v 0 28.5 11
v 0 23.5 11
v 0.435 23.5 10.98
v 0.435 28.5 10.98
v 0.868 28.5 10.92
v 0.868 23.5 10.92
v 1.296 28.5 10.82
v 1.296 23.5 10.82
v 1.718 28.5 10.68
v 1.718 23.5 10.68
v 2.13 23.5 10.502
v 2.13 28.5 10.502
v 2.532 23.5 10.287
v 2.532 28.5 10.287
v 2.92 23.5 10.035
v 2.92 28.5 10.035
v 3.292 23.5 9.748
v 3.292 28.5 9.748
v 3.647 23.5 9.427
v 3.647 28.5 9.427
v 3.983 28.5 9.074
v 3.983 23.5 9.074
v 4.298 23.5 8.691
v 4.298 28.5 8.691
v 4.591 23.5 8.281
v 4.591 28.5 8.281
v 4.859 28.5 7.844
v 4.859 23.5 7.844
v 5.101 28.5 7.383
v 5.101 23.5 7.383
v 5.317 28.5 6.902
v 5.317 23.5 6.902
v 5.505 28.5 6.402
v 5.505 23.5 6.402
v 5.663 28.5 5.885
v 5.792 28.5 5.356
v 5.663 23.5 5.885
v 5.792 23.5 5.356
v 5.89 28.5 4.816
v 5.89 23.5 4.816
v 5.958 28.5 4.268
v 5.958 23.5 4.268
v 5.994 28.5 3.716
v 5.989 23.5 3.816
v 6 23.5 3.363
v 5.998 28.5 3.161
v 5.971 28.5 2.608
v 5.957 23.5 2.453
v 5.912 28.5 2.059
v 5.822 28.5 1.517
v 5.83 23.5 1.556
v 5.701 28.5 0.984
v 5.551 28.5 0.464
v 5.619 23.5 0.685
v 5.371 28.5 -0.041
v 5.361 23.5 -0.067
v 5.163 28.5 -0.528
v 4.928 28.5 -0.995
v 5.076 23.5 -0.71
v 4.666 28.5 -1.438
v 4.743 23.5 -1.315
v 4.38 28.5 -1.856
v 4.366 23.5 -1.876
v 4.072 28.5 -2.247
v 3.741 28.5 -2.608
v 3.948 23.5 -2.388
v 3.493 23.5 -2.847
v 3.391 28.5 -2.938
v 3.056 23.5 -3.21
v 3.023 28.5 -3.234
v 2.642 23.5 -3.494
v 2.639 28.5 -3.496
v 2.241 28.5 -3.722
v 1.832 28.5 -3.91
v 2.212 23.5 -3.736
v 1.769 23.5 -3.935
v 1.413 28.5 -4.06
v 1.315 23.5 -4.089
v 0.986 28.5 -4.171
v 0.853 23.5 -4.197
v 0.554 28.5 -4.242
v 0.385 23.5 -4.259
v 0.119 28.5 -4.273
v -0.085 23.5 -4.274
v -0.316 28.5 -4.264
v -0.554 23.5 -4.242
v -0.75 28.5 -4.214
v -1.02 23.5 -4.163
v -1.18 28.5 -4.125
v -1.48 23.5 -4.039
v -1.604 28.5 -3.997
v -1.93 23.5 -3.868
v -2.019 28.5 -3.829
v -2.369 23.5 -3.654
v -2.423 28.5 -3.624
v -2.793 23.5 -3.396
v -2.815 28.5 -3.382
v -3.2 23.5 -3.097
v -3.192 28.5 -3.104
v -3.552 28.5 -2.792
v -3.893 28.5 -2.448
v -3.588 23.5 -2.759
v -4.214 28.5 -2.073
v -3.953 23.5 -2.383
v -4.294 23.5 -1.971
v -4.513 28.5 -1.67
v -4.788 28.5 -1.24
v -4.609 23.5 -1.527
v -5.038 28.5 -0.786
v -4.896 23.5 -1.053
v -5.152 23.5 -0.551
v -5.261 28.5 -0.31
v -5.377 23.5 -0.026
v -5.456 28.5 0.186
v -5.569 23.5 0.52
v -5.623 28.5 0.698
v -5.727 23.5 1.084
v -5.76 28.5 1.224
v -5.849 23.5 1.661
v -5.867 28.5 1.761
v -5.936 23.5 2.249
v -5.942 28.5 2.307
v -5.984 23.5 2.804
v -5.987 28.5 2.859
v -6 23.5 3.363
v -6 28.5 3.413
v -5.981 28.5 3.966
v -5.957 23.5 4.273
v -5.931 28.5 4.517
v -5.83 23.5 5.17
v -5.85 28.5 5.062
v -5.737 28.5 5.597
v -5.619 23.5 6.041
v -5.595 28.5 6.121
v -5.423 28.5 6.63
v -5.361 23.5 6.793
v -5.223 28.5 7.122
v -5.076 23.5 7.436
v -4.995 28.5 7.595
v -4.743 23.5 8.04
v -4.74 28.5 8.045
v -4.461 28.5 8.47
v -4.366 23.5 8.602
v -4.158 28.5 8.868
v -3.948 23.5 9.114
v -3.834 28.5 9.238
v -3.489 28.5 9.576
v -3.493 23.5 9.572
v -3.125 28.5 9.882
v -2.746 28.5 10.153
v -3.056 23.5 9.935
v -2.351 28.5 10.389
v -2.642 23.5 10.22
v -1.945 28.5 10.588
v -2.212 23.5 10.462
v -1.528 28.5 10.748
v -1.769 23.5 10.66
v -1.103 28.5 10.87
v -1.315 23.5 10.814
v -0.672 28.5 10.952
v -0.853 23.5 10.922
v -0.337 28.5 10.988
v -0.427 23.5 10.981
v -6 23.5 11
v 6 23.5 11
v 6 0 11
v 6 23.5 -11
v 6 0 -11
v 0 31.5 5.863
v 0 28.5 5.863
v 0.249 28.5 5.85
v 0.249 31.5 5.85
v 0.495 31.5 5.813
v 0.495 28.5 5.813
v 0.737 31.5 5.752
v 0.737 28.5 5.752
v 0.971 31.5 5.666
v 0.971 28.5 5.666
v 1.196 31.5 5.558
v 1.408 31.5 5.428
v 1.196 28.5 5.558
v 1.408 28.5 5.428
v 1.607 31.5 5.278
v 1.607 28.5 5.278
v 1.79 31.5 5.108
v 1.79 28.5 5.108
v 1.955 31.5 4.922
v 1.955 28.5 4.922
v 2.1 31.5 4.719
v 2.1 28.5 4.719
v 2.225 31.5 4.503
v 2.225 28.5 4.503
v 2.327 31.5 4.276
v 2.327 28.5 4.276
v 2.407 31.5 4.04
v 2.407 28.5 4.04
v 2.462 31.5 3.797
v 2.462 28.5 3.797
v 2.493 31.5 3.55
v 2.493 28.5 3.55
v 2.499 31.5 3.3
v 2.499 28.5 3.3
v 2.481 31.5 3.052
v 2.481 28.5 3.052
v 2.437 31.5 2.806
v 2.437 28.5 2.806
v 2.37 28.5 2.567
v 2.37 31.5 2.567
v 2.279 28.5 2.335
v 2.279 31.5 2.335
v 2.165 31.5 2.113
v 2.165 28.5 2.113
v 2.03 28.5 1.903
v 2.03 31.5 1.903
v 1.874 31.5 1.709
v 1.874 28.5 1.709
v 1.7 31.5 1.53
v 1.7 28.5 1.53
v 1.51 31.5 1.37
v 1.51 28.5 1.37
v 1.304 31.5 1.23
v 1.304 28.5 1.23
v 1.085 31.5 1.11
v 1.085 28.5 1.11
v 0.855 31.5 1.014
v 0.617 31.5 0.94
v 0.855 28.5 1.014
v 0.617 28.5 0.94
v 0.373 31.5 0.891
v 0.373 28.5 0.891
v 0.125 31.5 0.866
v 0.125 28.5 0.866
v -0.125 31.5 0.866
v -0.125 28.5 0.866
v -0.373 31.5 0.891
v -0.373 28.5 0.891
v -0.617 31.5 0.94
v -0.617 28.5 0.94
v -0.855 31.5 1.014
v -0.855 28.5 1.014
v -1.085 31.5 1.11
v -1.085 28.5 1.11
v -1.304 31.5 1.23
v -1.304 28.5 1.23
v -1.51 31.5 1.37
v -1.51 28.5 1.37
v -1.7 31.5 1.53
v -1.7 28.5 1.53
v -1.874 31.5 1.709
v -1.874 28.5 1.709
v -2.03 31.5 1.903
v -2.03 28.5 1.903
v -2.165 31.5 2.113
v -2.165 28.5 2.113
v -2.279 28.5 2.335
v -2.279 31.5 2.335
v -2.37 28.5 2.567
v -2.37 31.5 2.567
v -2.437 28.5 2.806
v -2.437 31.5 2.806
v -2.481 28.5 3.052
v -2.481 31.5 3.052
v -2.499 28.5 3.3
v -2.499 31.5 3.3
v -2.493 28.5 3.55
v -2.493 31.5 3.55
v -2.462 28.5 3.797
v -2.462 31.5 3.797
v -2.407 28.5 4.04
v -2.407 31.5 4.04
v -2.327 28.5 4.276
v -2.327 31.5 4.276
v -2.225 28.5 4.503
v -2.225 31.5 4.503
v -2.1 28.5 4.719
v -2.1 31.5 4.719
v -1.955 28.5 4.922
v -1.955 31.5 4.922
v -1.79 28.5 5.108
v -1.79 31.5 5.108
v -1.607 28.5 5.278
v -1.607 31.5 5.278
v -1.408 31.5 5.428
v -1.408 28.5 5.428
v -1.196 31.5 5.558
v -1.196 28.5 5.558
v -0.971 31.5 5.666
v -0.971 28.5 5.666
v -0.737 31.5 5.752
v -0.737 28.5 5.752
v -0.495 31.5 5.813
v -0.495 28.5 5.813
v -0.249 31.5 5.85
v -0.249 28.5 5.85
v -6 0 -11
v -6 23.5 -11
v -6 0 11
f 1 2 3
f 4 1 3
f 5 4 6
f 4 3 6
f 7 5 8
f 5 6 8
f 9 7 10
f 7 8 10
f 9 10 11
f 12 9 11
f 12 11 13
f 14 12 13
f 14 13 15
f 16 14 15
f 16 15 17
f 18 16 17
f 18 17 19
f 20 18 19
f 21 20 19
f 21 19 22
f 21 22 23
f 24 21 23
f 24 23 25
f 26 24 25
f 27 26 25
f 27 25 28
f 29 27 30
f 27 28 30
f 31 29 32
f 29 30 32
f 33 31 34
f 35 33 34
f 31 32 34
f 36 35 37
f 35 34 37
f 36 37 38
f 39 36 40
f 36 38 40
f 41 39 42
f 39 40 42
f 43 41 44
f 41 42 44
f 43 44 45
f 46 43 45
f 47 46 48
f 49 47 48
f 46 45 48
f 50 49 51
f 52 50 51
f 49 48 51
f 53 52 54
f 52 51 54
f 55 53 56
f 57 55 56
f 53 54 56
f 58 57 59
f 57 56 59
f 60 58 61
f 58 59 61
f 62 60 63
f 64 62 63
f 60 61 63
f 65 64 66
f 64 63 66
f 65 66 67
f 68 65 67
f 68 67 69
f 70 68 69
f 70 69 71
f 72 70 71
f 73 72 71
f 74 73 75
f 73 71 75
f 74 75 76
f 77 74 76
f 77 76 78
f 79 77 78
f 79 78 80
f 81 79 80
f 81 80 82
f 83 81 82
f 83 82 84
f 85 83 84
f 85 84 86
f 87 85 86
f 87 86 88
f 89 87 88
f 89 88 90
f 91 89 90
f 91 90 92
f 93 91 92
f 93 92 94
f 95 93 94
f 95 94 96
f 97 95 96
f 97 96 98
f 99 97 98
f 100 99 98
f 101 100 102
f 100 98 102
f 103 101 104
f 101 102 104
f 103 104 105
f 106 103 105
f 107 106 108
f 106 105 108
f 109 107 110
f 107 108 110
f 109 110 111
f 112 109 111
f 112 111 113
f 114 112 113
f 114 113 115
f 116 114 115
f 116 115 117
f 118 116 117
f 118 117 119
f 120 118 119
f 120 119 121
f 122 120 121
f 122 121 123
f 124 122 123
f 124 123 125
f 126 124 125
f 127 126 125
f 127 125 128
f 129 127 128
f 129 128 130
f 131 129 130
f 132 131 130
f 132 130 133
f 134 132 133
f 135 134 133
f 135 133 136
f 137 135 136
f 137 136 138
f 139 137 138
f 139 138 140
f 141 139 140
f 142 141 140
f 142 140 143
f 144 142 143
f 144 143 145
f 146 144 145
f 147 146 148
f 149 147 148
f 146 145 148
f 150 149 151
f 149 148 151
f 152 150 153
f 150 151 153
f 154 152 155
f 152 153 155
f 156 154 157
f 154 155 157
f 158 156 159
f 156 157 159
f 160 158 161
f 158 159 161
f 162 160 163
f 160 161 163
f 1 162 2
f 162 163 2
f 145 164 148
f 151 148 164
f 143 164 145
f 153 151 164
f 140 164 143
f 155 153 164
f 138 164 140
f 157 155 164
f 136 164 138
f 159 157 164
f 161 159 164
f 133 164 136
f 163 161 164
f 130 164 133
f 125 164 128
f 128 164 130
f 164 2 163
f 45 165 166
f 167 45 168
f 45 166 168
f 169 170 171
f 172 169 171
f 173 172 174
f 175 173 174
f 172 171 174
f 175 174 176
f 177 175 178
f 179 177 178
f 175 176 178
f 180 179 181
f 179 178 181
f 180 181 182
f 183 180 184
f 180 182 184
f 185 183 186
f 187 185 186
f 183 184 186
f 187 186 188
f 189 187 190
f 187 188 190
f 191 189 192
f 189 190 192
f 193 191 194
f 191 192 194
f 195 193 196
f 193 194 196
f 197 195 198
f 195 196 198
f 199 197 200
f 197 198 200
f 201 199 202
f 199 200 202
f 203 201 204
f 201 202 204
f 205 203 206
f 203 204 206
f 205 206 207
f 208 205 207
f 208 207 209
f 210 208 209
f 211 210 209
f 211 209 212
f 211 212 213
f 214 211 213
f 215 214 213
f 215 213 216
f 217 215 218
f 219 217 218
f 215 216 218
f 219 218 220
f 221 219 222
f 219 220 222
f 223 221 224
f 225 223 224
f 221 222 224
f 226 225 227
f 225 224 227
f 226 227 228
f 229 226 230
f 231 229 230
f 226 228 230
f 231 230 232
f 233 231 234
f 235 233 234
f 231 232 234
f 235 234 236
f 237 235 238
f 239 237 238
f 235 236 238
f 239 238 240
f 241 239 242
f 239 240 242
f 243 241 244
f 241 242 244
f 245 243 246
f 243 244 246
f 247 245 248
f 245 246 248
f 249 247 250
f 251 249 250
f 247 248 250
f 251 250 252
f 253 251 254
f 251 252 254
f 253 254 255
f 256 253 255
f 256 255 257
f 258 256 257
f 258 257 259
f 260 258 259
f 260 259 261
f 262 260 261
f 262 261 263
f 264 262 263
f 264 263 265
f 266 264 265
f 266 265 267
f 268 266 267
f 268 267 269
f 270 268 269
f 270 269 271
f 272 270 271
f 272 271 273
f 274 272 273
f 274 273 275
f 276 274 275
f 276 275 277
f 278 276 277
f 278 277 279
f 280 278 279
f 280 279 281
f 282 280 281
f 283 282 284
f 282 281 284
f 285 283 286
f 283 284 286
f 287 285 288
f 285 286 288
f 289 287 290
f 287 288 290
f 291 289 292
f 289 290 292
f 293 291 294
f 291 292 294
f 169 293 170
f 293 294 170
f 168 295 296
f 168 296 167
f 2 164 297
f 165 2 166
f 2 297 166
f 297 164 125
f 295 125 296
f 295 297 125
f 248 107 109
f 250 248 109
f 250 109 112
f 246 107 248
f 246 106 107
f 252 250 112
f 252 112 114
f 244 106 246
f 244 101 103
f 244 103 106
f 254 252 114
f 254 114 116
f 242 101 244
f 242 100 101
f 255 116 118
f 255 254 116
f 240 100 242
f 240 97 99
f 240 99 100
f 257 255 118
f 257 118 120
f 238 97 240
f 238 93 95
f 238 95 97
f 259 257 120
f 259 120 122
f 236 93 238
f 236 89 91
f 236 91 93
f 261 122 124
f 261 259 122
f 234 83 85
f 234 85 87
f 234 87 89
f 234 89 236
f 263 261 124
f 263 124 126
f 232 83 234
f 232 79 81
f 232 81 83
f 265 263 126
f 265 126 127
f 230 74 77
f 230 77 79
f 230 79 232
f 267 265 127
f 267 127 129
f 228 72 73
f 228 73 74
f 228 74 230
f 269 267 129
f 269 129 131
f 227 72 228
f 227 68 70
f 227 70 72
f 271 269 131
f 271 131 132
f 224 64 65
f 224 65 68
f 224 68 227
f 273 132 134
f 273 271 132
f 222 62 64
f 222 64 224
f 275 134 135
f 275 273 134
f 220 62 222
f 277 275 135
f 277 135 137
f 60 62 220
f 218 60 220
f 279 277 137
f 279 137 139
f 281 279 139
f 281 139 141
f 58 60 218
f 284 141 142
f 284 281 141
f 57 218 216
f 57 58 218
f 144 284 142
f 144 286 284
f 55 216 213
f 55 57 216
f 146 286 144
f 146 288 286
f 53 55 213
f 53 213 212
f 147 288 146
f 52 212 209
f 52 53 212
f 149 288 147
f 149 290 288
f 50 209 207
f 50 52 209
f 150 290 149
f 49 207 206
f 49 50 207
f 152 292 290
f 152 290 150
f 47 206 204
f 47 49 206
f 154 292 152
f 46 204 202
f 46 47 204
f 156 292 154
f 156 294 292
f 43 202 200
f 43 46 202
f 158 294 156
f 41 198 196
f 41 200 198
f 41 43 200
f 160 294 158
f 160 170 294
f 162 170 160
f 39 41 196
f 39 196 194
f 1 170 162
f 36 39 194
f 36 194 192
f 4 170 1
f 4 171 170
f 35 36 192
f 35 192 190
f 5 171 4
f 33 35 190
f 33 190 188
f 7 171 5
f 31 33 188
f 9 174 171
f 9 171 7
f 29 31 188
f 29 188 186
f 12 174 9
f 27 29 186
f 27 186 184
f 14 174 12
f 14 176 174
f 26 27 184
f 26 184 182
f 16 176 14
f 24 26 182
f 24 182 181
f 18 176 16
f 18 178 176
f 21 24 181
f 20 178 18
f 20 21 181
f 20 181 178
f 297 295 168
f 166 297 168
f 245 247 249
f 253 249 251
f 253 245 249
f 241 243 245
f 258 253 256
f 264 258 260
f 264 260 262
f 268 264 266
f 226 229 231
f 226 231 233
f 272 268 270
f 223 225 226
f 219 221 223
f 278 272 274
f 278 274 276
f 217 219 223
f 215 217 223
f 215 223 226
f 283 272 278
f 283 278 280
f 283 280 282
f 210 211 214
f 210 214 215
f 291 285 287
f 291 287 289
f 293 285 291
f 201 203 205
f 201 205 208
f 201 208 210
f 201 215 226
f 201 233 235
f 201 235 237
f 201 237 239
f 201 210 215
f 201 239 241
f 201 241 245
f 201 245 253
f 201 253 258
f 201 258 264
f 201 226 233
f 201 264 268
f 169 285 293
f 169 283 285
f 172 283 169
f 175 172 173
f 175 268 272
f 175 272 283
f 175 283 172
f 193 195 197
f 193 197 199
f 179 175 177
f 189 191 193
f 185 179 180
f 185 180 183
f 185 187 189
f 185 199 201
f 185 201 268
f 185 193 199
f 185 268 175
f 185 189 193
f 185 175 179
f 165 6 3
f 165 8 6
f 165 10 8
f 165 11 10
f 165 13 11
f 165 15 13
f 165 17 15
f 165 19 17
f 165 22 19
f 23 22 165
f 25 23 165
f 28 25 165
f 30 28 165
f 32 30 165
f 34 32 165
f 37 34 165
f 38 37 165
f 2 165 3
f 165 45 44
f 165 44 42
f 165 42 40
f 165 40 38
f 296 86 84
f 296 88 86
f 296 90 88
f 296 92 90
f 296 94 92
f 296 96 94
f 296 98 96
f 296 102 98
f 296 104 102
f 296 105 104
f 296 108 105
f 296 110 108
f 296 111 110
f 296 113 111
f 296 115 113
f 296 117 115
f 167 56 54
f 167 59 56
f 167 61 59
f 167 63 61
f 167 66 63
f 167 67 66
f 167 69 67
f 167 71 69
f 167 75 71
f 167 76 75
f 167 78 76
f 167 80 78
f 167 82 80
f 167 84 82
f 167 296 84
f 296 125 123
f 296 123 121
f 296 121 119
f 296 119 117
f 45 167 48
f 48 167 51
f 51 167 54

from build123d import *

# Parameters (mm, degrees)
SKETCH_1_W          = 12
SKETCH_1_H          = 22
EXTRUDE_1_DEPTH     = 16
SKETCH_2_W          = 12
SKETCH_2_H          = 32
EXTRUDE_2_DEPTH     = 2.5
SKETCH_4_W          = 12
SKETCH_4_H          = 22
EXTRUDE_4_DEPTH     = 5
SKETCH_5_RX         = 7.637200615
SKETCH_5_RY         = 6
EXTRUDE_5_DEPTH     = 5
SKETCH_6_R          = 2.5
EXTRUDE_6_DEPTH     = 3
SKETCH_7_W          = 5
SKETCH_7_H          = 2.5
CUT_EXTRUDE_1_DEPTH = 38.312866414


with BuildPart() as part:
    # 草图1 → 凸台-拉伸1 (new body)
    with BuildSketch(Plane(origin=(0, 0, 0), x_dir=(1, 0, 0), z_dir=(0, 1, 0))):
        Rectangle(SKETCH_1_W, SKETCH_1_H)
    extrude(amount=EXTRUDE_1_DEPTH)

    # 草图2 → 凸台-拉伸2 (add)
    with BuildSketch(Plane(origin=(0, 16, 0), x_dir=(1, 0, 0), z_dir=(0, 1, 0))):
        Rectangle(SKETCH_2_W, SKETCH_2_H)
    extrude(amount=EXTRUDE_2_DEPTH)

    # 草图4 → 凸台-拉伸4 (add)
    with BuildSketch(Plane(origin=(0, 18.5, 0), x_dir=(1, 0, 0), z_dir=(0, 1, 0))):
        Rectangle(SKETCH_4_W, SKETCH_4_H)
    extrude(amount=EXTRUDE_4_DEPTH)

    # 草图5 → 凸台-拉伸5 (add)
    with BuildSketch(Plane(origin=(0, 23.5, 0), x_dir=(1, 0, 0), z_dir=(0, 1, 0))):
        with Locations(Location((0, -3.362799385), (0, 0, -90))):
            Ellipse(SKETCH_5_RX, SKETCH_5_RY)
    extrude(amount=EXTRUDE_5_DEPTH)

    # 草图6 → 凸台-拉伸6 (add)
    with BuildSketch(Plane(origin=(0, 28.5, 0), x_dir=(1, 0, 0), z_dir=(0, 1, 0))):
        with Locations(Location((0, -3.362799385, 0), (0, 0, 270))):
            Circle(SKETCH_6_R)
    extrude(amount=EXTRUDE_6_DEPTH)

    # 草图7 → 切除-拉伸1 (cut, through all)
    with BuildSketch(Plane.ZY.offset(6)):
        with Locations((-13.5, 17.25)):
            Rectangle(SKETCH_7_W, SKETCH_7_H)
        with Locations((13.5, 17.25)):
            Rectangle(SKETCH_7_W, SKETCH_7_H)
    extrude(amount=-CUT_EXTRUDE_1_DEPTH, mode=Mode.SUBTRACT)


solid = part.part
